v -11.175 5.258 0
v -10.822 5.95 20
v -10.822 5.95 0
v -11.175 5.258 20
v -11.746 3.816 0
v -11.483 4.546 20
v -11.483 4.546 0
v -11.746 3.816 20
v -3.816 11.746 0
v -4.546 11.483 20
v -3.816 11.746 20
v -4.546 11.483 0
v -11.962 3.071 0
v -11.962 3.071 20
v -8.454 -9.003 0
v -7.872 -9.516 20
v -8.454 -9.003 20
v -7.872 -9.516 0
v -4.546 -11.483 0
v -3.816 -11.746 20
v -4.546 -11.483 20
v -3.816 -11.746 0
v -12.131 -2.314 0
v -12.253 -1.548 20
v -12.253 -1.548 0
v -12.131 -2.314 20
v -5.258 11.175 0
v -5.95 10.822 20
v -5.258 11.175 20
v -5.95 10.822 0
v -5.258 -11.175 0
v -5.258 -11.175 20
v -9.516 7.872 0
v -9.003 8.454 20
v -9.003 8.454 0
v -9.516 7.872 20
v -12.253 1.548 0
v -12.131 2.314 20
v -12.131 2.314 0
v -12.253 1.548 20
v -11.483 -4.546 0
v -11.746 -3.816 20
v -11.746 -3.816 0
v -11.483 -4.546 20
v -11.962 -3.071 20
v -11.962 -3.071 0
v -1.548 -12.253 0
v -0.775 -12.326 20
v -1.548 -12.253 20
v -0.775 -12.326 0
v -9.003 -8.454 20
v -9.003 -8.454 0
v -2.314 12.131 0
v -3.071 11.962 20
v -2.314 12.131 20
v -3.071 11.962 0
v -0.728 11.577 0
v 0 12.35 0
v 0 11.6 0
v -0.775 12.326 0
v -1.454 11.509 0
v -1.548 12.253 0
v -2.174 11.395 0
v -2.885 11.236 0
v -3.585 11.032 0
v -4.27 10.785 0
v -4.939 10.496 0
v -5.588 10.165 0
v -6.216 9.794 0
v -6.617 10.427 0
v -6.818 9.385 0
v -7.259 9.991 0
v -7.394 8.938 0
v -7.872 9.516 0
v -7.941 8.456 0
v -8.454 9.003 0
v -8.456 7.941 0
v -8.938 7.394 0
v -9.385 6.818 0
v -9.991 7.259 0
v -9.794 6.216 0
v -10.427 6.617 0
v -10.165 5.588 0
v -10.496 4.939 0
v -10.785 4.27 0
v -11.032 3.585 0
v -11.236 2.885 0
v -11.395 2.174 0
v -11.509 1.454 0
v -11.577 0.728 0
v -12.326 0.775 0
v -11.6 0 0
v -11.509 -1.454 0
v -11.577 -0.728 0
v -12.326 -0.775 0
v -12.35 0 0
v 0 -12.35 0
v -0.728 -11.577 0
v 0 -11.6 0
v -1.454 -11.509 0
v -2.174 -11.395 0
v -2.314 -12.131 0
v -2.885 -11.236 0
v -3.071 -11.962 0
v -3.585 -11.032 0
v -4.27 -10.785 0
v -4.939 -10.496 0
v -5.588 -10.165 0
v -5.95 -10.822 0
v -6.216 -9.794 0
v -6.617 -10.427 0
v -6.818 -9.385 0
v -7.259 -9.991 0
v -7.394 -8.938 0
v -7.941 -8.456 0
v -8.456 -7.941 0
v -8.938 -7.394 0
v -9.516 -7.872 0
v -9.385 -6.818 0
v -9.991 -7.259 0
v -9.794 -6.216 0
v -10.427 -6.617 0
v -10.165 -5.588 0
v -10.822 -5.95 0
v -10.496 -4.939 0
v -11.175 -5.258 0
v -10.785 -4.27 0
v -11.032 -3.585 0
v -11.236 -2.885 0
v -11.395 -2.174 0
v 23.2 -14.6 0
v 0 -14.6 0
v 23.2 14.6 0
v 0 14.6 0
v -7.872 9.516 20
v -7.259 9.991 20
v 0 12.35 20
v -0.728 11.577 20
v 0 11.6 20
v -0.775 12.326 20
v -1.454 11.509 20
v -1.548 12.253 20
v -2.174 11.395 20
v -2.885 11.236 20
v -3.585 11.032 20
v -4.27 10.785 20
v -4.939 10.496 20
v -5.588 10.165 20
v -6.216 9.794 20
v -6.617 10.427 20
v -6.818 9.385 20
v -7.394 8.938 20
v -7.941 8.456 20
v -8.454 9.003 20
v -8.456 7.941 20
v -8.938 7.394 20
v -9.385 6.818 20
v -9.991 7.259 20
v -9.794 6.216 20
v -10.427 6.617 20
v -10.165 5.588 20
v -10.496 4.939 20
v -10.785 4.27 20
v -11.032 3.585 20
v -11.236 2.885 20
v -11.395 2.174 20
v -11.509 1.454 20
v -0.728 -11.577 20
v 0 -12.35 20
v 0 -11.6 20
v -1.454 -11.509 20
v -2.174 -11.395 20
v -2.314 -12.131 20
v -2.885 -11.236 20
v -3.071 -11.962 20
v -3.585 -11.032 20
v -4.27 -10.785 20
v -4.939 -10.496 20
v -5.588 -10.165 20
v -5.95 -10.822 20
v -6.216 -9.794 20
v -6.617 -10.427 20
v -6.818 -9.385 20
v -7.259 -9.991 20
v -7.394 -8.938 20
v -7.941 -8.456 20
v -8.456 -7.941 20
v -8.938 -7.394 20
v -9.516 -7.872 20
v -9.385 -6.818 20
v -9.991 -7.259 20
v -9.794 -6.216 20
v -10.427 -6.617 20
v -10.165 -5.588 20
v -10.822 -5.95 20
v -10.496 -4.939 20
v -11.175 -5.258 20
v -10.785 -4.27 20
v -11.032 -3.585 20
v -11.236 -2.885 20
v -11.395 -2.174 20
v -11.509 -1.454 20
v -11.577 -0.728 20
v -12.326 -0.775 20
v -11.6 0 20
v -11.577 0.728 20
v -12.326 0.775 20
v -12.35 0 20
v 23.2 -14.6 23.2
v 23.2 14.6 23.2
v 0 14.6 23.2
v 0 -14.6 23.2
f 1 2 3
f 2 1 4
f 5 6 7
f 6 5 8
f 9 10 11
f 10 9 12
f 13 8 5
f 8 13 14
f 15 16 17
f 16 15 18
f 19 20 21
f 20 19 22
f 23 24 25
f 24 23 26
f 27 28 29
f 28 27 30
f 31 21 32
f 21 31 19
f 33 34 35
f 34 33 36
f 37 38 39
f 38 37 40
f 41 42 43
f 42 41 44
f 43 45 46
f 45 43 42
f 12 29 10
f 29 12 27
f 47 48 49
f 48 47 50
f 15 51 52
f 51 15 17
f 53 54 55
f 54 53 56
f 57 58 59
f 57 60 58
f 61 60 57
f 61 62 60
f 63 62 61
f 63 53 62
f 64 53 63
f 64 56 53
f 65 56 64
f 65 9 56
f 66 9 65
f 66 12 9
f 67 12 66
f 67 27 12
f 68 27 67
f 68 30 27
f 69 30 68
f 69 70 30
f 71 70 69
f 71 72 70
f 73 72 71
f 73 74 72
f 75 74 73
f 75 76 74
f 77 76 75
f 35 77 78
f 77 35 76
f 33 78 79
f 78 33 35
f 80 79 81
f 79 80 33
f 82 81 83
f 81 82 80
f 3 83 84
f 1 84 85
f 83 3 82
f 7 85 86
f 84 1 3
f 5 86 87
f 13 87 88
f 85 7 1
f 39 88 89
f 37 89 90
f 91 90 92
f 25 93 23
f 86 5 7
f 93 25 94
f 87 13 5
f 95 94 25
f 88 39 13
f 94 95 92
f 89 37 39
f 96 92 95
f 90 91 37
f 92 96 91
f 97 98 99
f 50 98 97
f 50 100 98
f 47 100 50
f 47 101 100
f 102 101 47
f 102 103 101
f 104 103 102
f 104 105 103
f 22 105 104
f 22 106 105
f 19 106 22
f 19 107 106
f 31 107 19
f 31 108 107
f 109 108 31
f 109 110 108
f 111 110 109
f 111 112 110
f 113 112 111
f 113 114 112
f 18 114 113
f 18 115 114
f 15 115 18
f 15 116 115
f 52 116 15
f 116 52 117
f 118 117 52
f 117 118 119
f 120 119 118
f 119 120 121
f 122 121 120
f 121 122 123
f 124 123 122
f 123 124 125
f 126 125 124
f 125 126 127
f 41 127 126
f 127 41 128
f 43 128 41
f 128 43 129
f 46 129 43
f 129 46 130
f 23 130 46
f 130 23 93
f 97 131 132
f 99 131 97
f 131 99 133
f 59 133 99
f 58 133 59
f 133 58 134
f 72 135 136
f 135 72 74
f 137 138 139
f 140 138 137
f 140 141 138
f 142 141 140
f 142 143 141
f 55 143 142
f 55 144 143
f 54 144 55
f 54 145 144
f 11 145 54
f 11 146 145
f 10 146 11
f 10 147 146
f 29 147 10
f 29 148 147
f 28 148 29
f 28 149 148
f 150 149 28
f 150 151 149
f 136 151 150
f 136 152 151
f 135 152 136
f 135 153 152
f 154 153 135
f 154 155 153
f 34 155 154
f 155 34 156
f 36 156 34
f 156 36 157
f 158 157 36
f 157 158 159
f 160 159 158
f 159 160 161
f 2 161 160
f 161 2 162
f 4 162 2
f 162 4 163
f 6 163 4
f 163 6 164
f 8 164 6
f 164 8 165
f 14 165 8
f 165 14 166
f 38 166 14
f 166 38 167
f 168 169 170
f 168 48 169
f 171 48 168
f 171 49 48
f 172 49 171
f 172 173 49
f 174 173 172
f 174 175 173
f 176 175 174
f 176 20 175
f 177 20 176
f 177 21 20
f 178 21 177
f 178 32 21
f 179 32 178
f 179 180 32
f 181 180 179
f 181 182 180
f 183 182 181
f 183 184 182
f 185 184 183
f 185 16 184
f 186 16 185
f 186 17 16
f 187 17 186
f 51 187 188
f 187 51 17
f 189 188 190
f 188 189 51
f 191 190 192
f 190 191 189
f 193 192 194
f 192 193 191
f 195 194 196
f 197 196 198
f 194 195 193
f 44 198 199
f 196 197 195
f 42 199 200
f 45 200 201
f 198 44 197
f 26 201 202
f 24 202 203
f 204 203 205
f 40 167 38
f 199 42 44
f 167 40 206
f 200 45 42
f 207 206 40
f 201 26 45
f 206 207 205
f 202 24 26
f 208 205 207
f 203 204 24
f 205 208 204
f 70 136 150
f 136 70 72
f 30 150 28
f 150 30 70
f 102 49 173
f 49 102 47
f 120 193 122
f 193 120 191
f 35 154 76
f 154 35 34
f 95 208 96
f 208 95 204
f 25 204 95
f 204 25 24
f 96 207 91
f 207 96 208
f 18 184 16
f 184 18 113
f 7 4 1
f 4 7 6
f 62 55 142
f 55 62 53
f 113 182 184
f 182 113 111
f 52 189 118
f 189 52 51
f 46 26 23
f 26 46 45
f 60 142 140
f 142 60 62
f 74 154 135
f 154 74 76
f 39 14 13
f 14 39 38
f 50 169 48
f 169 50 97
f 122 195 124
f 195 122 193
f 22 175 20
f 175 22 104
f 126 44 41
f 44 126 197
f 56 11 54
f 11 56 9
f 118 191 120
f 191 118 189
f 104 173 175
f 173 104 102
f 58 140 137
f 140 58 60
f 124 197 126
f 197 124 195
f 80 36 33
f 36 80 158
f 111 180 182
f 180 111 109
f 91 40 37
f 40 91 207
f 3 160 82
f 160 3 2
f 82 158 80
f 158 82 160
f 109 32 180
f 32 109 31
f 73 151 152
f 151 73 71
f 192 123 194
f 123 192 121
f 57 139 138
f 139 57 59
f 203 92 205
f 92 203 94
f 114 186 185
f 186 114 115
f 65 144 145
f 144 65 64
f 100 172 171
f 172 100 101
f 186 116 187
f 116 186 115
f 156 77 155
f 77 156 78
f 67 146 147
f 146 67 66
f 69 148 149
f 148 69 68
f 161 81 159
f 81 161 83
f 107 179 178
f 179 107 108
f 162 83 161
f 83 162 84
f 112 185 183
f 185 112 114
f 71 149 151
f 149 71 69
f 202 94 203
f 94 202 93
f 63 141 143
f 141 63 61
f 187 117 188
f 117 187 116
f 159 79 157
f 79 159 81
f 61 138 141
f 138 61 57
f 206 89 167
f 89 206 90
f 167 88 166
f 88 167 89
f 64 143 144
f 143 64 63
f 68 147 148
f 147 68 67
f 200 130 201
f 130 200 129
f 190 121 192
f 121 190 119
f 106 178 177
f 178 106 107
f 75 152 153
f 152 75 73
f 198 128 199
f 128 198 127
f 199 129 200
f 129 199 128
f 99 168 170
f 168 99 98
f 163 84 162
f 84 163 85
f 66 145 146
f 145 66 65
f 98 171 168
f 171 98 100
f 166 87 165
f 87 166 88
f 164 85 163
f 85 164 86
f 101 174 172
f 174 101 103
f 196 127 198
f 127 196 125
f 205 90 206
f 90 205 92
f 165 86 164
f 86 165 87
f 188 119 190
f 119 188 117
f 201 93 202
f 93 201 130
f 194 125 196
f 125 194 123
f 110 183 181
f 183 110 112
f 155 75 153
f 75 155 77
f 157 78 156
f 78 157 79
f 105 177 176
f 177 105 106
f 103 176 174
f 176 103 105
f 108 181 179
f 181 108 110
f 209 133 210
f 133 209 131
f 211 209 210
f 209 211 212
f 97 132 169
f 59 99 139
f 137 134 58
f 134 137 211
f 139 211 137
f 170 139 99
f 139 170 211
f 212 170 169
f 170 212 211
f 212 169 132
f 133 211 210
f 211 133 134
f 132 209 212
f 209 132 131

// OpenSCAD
$fn=100;


ml_clip_width=50; // Default: 50. The width of the clip
ml_clip_depth=30.2; // This is the width of the lamp. I used an U-profile with a size of 30mm. Recommendation to add 0.2 to fit perfectly. 
ml_clip_heigth=20.6; // The height of the lamp. This is the height of the U-Profile and the thickness of the diffusor. the Diffusor has a thickenss of 0.4 and i recommnd to add another 0.2mm to fit perfectly (20.6 for 20 mm profile).
ml_clip_thickness=1.0; // The material thickness of the clip (One mm will be added automatically)

ml_pipe_diameter=21.3; // The diameter of the pipe which holds the lamp. "ml_pipe_sleeve_extension" will automatically be added, so that the holder slips well over the tube.
ml_pipe_sleeve_extension=0.4;
ml_pipe_sleeve_length=100;
ml_pipe_sleeve_thickness=1.5;


inner_dia = ml_pipe_diameter + ml_pipe_sleeve_extension + ml_pipe_sleeve_thickness;
difference() {
    cylinder(h = 20, r = (inner_dia +  ml_pipe_sleeve_thickness) / 2);
    translate([0, 0, -1])
    cylinder(h = 22, r = inner_dia / 2);

}

    translate([0, -inner_dia / 2 - ml_pipe_sleeve_thickness * 2, 0])
    cube([inner_dia, inner_dia  + ml_pipe_sleeve_thickness * 4, inner_dia]);
